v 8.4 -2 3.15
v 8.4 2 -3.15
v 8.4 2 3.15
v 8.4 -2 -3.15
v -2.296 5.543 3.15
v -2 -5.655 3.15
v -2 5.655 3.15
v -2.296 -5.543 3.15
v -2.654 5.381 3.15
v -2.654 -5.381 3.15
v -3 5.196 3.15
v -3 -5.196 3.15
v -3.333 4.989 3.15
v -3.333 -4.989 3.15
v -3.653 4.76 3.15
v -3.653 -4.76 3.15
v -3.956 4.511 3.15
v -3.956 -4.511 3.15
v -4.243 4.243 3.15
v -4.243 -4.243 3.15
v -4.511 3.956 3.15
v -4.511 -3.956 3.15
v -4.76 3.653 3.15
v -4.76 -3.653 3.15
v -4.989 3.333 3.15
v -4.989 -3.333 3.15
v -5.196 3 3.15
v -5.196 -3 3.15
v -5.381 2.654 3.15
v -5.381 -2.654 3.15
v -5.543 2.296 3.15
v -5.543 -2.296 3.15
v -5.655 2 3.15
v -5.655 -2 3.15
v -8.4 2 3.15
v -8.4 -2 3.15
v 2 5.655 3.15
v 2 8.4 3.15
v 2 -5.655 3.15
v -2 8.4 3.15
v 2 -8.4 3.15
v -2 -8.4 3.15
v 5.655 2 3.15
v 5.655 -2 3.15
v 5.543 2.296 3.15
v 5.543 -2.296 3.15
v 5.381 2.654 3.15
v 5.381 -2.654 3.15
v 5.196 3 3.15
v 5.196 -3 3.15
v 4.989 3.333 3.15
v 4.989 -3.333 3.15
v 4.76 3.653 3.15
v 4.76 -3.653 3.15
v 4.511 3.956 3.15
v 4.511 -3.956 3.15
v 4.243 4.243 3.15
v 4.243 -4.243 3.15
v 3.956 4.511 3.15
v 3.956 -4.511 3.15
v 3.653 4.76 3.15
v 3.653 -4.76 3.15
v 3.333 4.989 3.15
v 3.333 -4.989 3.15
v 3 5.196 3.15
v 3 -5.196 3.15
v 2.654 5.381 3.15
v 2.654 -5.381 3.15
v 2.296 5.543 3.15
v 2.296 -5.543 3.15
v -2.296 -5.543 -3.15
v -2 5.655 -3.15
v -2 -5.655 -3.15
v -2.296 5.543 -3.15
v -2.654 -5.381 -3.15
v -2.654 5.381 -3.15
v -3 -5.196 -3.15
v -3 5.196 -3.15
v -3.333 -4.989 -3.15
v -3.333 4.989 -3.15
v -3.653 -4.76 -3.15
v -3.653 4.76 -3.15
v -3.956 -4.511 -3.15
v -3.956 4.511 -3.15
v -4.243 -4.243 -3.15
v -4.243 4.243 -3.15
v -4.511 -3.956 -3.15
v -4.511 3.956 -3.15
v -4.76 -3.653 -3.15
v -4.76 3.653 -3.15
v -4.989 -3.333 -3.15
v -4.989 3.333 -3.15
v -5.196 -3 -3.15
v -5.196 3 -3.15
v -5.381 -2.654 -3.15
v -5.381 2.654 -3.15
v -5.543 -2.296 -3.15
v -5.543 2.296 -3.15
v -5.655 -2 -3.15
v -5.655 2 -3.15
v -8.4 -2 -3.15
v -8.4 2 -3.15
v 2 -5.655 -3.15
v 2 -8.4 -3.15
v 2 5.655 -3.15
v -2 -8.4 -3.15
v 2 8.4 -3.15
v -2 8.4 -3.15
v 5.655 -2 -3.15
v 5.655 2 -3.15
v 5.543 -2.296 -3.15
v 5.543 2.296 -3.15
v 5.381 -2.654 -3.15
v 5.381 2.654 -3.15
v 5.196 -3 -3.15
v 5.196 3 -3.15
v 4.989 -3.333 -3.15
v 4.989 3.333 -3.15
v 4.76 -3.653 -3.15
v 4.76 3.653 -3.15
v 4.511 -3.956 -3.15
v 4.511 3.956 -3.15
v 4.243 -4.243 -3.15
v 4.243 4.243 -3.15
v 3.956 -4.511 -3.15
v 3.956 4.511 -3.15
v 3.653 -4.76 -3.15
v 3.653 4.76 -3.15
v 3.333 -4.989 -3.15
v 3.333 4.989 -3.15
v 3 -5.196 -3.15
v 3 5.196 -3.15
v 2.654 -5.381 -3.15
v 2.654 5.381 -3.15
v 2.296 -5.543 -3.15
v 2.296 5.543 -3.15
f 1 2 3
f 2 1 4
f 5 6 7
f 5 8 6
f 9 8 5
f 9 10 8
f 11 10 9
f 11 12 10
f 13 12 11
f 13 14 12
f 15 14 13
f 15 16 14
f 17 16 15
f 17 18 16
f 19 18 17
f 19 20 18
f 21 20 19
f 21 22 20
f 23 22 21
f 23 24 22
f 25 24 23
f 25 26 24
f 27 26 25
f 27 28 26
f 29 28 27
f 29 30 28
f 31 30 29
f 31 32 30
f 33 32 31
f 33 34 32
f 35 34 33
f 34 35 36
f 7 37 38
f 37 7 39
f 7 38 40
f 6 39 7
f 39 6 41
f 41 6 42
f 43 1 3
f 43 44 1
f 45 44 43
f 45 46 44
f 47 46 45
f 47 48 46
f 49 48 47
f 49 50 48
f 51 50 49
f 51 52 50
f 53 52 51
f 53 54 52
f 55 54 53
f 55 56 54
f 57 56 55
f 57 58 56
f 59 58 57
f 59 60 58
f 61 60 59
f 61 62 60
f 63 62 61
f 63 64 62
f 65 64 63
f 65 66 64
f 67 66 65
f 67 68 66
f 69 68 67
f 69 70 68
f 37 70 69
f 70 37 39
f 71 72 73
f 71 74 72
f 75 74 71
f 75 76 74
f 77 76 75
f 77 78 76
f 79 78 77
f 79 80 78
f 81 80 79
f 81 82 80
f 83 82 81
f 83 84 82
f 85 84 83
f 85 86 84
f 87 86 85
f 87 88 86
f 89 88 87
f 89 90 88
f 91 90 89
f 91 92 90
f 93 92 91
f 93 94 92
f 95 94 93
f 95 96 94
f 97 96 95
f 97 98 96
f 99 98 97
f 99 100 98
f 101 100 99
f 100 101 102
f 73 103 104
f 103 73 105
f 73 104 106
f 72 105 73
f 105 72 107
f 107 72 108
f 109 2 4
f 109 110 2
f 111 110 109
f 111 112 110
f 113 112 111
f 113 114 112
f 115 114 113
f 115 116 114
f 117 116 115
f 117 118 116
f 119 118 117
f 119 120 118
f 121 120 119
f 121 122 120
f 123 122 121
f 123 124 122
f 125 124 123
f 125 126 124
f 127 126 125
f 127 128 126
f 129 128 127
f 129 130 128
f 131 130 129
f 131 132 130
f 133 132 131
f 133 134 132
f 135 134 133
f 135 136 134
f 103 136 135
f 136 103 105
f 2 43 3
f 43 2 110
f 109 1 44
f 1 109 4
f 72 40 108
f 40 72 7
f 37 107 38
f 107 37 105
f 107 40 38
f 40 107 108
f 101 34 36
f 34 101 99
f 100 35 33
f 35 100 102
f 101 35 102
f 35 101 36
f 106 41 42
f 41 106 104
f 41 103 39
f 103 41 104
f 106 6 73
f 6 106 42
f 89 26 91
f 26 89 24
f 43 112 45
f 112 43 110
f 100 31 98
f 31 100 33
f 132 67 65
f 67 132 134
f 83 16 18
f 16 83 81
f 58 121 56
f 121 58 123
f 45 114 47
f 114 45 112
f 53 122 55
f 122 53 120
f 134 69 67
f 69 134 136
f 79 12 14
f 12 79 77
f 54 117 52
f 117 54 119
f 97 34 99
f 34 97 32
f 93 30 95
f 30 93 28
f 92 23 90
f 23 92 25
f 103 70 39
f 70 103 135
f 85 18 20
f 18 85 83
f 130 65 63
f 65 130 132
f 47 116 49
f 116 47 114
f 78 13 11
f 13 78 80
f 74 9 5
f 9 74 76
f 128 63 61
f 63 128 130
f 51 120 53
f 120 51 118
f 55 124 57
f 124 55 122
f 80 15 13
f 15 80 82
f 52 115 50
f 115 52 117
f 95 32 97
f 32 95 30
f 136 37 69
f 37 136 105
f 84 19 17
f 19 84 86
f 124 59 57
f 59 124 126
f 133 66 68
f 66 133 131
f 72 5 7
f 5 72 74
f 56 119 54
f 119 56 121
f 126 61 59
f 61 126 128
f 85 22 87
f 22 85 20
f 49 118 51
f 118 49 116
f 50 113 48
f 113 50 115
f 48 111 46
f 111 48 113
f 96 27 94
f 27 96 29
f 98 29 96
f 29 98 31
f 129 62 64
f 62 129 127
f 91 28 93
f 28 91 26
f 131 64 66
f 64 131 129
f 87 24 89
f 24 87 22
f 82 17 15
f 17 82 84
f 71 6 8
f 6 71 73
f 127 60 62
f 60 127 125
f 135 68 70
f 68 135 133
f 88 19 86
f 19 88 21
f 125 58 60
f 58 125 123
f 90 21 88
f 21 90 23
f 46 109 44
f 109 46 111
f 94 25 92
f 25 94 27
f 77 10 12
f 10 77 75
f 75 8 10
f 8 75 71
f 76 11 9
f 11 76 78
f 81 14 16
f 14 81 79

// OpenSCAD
$fn = 96;

// Target bounding box (mm)
bbox_x = 16.8;
bbox_y = 16.8;
bbox_z = 6.3;

// Main disk
disk_d = 12.0;
disk_r = disk_d/2;
thickness = bbox_z;

// Lugs (4x at 90°)
lug_count = 4;
lug_w_tangential = 4.0;                 // width of lug (tangential)
lug_len_radial = (bbox_x/2) - disk_r;   // set so overall X/Y matches bbox
overlap = 0.8;                          // overlap into disk to ensure one solid

module disk_body() {
    cylinder(r=disk_r, h=thickness, center=true);
}

module lug() {
    // Lug extends outward from disk edge; overlaps inward by 'overlap'
    // Inner edge radius = disk_r - overlap
    // Outer edge radius = disk_r + lug_len_radial
    translate([disk_r + lug_len_radial/2 - overlap/2, 0, 0])
        cube([lug_len_radial + overlap, lug_w_tangential, thickness], center=true);
}

union() {
    disk_body();
    for (i = [0:lug_count-1])
        rotate([0, 0, i*360/lug_count]) lug();
}
